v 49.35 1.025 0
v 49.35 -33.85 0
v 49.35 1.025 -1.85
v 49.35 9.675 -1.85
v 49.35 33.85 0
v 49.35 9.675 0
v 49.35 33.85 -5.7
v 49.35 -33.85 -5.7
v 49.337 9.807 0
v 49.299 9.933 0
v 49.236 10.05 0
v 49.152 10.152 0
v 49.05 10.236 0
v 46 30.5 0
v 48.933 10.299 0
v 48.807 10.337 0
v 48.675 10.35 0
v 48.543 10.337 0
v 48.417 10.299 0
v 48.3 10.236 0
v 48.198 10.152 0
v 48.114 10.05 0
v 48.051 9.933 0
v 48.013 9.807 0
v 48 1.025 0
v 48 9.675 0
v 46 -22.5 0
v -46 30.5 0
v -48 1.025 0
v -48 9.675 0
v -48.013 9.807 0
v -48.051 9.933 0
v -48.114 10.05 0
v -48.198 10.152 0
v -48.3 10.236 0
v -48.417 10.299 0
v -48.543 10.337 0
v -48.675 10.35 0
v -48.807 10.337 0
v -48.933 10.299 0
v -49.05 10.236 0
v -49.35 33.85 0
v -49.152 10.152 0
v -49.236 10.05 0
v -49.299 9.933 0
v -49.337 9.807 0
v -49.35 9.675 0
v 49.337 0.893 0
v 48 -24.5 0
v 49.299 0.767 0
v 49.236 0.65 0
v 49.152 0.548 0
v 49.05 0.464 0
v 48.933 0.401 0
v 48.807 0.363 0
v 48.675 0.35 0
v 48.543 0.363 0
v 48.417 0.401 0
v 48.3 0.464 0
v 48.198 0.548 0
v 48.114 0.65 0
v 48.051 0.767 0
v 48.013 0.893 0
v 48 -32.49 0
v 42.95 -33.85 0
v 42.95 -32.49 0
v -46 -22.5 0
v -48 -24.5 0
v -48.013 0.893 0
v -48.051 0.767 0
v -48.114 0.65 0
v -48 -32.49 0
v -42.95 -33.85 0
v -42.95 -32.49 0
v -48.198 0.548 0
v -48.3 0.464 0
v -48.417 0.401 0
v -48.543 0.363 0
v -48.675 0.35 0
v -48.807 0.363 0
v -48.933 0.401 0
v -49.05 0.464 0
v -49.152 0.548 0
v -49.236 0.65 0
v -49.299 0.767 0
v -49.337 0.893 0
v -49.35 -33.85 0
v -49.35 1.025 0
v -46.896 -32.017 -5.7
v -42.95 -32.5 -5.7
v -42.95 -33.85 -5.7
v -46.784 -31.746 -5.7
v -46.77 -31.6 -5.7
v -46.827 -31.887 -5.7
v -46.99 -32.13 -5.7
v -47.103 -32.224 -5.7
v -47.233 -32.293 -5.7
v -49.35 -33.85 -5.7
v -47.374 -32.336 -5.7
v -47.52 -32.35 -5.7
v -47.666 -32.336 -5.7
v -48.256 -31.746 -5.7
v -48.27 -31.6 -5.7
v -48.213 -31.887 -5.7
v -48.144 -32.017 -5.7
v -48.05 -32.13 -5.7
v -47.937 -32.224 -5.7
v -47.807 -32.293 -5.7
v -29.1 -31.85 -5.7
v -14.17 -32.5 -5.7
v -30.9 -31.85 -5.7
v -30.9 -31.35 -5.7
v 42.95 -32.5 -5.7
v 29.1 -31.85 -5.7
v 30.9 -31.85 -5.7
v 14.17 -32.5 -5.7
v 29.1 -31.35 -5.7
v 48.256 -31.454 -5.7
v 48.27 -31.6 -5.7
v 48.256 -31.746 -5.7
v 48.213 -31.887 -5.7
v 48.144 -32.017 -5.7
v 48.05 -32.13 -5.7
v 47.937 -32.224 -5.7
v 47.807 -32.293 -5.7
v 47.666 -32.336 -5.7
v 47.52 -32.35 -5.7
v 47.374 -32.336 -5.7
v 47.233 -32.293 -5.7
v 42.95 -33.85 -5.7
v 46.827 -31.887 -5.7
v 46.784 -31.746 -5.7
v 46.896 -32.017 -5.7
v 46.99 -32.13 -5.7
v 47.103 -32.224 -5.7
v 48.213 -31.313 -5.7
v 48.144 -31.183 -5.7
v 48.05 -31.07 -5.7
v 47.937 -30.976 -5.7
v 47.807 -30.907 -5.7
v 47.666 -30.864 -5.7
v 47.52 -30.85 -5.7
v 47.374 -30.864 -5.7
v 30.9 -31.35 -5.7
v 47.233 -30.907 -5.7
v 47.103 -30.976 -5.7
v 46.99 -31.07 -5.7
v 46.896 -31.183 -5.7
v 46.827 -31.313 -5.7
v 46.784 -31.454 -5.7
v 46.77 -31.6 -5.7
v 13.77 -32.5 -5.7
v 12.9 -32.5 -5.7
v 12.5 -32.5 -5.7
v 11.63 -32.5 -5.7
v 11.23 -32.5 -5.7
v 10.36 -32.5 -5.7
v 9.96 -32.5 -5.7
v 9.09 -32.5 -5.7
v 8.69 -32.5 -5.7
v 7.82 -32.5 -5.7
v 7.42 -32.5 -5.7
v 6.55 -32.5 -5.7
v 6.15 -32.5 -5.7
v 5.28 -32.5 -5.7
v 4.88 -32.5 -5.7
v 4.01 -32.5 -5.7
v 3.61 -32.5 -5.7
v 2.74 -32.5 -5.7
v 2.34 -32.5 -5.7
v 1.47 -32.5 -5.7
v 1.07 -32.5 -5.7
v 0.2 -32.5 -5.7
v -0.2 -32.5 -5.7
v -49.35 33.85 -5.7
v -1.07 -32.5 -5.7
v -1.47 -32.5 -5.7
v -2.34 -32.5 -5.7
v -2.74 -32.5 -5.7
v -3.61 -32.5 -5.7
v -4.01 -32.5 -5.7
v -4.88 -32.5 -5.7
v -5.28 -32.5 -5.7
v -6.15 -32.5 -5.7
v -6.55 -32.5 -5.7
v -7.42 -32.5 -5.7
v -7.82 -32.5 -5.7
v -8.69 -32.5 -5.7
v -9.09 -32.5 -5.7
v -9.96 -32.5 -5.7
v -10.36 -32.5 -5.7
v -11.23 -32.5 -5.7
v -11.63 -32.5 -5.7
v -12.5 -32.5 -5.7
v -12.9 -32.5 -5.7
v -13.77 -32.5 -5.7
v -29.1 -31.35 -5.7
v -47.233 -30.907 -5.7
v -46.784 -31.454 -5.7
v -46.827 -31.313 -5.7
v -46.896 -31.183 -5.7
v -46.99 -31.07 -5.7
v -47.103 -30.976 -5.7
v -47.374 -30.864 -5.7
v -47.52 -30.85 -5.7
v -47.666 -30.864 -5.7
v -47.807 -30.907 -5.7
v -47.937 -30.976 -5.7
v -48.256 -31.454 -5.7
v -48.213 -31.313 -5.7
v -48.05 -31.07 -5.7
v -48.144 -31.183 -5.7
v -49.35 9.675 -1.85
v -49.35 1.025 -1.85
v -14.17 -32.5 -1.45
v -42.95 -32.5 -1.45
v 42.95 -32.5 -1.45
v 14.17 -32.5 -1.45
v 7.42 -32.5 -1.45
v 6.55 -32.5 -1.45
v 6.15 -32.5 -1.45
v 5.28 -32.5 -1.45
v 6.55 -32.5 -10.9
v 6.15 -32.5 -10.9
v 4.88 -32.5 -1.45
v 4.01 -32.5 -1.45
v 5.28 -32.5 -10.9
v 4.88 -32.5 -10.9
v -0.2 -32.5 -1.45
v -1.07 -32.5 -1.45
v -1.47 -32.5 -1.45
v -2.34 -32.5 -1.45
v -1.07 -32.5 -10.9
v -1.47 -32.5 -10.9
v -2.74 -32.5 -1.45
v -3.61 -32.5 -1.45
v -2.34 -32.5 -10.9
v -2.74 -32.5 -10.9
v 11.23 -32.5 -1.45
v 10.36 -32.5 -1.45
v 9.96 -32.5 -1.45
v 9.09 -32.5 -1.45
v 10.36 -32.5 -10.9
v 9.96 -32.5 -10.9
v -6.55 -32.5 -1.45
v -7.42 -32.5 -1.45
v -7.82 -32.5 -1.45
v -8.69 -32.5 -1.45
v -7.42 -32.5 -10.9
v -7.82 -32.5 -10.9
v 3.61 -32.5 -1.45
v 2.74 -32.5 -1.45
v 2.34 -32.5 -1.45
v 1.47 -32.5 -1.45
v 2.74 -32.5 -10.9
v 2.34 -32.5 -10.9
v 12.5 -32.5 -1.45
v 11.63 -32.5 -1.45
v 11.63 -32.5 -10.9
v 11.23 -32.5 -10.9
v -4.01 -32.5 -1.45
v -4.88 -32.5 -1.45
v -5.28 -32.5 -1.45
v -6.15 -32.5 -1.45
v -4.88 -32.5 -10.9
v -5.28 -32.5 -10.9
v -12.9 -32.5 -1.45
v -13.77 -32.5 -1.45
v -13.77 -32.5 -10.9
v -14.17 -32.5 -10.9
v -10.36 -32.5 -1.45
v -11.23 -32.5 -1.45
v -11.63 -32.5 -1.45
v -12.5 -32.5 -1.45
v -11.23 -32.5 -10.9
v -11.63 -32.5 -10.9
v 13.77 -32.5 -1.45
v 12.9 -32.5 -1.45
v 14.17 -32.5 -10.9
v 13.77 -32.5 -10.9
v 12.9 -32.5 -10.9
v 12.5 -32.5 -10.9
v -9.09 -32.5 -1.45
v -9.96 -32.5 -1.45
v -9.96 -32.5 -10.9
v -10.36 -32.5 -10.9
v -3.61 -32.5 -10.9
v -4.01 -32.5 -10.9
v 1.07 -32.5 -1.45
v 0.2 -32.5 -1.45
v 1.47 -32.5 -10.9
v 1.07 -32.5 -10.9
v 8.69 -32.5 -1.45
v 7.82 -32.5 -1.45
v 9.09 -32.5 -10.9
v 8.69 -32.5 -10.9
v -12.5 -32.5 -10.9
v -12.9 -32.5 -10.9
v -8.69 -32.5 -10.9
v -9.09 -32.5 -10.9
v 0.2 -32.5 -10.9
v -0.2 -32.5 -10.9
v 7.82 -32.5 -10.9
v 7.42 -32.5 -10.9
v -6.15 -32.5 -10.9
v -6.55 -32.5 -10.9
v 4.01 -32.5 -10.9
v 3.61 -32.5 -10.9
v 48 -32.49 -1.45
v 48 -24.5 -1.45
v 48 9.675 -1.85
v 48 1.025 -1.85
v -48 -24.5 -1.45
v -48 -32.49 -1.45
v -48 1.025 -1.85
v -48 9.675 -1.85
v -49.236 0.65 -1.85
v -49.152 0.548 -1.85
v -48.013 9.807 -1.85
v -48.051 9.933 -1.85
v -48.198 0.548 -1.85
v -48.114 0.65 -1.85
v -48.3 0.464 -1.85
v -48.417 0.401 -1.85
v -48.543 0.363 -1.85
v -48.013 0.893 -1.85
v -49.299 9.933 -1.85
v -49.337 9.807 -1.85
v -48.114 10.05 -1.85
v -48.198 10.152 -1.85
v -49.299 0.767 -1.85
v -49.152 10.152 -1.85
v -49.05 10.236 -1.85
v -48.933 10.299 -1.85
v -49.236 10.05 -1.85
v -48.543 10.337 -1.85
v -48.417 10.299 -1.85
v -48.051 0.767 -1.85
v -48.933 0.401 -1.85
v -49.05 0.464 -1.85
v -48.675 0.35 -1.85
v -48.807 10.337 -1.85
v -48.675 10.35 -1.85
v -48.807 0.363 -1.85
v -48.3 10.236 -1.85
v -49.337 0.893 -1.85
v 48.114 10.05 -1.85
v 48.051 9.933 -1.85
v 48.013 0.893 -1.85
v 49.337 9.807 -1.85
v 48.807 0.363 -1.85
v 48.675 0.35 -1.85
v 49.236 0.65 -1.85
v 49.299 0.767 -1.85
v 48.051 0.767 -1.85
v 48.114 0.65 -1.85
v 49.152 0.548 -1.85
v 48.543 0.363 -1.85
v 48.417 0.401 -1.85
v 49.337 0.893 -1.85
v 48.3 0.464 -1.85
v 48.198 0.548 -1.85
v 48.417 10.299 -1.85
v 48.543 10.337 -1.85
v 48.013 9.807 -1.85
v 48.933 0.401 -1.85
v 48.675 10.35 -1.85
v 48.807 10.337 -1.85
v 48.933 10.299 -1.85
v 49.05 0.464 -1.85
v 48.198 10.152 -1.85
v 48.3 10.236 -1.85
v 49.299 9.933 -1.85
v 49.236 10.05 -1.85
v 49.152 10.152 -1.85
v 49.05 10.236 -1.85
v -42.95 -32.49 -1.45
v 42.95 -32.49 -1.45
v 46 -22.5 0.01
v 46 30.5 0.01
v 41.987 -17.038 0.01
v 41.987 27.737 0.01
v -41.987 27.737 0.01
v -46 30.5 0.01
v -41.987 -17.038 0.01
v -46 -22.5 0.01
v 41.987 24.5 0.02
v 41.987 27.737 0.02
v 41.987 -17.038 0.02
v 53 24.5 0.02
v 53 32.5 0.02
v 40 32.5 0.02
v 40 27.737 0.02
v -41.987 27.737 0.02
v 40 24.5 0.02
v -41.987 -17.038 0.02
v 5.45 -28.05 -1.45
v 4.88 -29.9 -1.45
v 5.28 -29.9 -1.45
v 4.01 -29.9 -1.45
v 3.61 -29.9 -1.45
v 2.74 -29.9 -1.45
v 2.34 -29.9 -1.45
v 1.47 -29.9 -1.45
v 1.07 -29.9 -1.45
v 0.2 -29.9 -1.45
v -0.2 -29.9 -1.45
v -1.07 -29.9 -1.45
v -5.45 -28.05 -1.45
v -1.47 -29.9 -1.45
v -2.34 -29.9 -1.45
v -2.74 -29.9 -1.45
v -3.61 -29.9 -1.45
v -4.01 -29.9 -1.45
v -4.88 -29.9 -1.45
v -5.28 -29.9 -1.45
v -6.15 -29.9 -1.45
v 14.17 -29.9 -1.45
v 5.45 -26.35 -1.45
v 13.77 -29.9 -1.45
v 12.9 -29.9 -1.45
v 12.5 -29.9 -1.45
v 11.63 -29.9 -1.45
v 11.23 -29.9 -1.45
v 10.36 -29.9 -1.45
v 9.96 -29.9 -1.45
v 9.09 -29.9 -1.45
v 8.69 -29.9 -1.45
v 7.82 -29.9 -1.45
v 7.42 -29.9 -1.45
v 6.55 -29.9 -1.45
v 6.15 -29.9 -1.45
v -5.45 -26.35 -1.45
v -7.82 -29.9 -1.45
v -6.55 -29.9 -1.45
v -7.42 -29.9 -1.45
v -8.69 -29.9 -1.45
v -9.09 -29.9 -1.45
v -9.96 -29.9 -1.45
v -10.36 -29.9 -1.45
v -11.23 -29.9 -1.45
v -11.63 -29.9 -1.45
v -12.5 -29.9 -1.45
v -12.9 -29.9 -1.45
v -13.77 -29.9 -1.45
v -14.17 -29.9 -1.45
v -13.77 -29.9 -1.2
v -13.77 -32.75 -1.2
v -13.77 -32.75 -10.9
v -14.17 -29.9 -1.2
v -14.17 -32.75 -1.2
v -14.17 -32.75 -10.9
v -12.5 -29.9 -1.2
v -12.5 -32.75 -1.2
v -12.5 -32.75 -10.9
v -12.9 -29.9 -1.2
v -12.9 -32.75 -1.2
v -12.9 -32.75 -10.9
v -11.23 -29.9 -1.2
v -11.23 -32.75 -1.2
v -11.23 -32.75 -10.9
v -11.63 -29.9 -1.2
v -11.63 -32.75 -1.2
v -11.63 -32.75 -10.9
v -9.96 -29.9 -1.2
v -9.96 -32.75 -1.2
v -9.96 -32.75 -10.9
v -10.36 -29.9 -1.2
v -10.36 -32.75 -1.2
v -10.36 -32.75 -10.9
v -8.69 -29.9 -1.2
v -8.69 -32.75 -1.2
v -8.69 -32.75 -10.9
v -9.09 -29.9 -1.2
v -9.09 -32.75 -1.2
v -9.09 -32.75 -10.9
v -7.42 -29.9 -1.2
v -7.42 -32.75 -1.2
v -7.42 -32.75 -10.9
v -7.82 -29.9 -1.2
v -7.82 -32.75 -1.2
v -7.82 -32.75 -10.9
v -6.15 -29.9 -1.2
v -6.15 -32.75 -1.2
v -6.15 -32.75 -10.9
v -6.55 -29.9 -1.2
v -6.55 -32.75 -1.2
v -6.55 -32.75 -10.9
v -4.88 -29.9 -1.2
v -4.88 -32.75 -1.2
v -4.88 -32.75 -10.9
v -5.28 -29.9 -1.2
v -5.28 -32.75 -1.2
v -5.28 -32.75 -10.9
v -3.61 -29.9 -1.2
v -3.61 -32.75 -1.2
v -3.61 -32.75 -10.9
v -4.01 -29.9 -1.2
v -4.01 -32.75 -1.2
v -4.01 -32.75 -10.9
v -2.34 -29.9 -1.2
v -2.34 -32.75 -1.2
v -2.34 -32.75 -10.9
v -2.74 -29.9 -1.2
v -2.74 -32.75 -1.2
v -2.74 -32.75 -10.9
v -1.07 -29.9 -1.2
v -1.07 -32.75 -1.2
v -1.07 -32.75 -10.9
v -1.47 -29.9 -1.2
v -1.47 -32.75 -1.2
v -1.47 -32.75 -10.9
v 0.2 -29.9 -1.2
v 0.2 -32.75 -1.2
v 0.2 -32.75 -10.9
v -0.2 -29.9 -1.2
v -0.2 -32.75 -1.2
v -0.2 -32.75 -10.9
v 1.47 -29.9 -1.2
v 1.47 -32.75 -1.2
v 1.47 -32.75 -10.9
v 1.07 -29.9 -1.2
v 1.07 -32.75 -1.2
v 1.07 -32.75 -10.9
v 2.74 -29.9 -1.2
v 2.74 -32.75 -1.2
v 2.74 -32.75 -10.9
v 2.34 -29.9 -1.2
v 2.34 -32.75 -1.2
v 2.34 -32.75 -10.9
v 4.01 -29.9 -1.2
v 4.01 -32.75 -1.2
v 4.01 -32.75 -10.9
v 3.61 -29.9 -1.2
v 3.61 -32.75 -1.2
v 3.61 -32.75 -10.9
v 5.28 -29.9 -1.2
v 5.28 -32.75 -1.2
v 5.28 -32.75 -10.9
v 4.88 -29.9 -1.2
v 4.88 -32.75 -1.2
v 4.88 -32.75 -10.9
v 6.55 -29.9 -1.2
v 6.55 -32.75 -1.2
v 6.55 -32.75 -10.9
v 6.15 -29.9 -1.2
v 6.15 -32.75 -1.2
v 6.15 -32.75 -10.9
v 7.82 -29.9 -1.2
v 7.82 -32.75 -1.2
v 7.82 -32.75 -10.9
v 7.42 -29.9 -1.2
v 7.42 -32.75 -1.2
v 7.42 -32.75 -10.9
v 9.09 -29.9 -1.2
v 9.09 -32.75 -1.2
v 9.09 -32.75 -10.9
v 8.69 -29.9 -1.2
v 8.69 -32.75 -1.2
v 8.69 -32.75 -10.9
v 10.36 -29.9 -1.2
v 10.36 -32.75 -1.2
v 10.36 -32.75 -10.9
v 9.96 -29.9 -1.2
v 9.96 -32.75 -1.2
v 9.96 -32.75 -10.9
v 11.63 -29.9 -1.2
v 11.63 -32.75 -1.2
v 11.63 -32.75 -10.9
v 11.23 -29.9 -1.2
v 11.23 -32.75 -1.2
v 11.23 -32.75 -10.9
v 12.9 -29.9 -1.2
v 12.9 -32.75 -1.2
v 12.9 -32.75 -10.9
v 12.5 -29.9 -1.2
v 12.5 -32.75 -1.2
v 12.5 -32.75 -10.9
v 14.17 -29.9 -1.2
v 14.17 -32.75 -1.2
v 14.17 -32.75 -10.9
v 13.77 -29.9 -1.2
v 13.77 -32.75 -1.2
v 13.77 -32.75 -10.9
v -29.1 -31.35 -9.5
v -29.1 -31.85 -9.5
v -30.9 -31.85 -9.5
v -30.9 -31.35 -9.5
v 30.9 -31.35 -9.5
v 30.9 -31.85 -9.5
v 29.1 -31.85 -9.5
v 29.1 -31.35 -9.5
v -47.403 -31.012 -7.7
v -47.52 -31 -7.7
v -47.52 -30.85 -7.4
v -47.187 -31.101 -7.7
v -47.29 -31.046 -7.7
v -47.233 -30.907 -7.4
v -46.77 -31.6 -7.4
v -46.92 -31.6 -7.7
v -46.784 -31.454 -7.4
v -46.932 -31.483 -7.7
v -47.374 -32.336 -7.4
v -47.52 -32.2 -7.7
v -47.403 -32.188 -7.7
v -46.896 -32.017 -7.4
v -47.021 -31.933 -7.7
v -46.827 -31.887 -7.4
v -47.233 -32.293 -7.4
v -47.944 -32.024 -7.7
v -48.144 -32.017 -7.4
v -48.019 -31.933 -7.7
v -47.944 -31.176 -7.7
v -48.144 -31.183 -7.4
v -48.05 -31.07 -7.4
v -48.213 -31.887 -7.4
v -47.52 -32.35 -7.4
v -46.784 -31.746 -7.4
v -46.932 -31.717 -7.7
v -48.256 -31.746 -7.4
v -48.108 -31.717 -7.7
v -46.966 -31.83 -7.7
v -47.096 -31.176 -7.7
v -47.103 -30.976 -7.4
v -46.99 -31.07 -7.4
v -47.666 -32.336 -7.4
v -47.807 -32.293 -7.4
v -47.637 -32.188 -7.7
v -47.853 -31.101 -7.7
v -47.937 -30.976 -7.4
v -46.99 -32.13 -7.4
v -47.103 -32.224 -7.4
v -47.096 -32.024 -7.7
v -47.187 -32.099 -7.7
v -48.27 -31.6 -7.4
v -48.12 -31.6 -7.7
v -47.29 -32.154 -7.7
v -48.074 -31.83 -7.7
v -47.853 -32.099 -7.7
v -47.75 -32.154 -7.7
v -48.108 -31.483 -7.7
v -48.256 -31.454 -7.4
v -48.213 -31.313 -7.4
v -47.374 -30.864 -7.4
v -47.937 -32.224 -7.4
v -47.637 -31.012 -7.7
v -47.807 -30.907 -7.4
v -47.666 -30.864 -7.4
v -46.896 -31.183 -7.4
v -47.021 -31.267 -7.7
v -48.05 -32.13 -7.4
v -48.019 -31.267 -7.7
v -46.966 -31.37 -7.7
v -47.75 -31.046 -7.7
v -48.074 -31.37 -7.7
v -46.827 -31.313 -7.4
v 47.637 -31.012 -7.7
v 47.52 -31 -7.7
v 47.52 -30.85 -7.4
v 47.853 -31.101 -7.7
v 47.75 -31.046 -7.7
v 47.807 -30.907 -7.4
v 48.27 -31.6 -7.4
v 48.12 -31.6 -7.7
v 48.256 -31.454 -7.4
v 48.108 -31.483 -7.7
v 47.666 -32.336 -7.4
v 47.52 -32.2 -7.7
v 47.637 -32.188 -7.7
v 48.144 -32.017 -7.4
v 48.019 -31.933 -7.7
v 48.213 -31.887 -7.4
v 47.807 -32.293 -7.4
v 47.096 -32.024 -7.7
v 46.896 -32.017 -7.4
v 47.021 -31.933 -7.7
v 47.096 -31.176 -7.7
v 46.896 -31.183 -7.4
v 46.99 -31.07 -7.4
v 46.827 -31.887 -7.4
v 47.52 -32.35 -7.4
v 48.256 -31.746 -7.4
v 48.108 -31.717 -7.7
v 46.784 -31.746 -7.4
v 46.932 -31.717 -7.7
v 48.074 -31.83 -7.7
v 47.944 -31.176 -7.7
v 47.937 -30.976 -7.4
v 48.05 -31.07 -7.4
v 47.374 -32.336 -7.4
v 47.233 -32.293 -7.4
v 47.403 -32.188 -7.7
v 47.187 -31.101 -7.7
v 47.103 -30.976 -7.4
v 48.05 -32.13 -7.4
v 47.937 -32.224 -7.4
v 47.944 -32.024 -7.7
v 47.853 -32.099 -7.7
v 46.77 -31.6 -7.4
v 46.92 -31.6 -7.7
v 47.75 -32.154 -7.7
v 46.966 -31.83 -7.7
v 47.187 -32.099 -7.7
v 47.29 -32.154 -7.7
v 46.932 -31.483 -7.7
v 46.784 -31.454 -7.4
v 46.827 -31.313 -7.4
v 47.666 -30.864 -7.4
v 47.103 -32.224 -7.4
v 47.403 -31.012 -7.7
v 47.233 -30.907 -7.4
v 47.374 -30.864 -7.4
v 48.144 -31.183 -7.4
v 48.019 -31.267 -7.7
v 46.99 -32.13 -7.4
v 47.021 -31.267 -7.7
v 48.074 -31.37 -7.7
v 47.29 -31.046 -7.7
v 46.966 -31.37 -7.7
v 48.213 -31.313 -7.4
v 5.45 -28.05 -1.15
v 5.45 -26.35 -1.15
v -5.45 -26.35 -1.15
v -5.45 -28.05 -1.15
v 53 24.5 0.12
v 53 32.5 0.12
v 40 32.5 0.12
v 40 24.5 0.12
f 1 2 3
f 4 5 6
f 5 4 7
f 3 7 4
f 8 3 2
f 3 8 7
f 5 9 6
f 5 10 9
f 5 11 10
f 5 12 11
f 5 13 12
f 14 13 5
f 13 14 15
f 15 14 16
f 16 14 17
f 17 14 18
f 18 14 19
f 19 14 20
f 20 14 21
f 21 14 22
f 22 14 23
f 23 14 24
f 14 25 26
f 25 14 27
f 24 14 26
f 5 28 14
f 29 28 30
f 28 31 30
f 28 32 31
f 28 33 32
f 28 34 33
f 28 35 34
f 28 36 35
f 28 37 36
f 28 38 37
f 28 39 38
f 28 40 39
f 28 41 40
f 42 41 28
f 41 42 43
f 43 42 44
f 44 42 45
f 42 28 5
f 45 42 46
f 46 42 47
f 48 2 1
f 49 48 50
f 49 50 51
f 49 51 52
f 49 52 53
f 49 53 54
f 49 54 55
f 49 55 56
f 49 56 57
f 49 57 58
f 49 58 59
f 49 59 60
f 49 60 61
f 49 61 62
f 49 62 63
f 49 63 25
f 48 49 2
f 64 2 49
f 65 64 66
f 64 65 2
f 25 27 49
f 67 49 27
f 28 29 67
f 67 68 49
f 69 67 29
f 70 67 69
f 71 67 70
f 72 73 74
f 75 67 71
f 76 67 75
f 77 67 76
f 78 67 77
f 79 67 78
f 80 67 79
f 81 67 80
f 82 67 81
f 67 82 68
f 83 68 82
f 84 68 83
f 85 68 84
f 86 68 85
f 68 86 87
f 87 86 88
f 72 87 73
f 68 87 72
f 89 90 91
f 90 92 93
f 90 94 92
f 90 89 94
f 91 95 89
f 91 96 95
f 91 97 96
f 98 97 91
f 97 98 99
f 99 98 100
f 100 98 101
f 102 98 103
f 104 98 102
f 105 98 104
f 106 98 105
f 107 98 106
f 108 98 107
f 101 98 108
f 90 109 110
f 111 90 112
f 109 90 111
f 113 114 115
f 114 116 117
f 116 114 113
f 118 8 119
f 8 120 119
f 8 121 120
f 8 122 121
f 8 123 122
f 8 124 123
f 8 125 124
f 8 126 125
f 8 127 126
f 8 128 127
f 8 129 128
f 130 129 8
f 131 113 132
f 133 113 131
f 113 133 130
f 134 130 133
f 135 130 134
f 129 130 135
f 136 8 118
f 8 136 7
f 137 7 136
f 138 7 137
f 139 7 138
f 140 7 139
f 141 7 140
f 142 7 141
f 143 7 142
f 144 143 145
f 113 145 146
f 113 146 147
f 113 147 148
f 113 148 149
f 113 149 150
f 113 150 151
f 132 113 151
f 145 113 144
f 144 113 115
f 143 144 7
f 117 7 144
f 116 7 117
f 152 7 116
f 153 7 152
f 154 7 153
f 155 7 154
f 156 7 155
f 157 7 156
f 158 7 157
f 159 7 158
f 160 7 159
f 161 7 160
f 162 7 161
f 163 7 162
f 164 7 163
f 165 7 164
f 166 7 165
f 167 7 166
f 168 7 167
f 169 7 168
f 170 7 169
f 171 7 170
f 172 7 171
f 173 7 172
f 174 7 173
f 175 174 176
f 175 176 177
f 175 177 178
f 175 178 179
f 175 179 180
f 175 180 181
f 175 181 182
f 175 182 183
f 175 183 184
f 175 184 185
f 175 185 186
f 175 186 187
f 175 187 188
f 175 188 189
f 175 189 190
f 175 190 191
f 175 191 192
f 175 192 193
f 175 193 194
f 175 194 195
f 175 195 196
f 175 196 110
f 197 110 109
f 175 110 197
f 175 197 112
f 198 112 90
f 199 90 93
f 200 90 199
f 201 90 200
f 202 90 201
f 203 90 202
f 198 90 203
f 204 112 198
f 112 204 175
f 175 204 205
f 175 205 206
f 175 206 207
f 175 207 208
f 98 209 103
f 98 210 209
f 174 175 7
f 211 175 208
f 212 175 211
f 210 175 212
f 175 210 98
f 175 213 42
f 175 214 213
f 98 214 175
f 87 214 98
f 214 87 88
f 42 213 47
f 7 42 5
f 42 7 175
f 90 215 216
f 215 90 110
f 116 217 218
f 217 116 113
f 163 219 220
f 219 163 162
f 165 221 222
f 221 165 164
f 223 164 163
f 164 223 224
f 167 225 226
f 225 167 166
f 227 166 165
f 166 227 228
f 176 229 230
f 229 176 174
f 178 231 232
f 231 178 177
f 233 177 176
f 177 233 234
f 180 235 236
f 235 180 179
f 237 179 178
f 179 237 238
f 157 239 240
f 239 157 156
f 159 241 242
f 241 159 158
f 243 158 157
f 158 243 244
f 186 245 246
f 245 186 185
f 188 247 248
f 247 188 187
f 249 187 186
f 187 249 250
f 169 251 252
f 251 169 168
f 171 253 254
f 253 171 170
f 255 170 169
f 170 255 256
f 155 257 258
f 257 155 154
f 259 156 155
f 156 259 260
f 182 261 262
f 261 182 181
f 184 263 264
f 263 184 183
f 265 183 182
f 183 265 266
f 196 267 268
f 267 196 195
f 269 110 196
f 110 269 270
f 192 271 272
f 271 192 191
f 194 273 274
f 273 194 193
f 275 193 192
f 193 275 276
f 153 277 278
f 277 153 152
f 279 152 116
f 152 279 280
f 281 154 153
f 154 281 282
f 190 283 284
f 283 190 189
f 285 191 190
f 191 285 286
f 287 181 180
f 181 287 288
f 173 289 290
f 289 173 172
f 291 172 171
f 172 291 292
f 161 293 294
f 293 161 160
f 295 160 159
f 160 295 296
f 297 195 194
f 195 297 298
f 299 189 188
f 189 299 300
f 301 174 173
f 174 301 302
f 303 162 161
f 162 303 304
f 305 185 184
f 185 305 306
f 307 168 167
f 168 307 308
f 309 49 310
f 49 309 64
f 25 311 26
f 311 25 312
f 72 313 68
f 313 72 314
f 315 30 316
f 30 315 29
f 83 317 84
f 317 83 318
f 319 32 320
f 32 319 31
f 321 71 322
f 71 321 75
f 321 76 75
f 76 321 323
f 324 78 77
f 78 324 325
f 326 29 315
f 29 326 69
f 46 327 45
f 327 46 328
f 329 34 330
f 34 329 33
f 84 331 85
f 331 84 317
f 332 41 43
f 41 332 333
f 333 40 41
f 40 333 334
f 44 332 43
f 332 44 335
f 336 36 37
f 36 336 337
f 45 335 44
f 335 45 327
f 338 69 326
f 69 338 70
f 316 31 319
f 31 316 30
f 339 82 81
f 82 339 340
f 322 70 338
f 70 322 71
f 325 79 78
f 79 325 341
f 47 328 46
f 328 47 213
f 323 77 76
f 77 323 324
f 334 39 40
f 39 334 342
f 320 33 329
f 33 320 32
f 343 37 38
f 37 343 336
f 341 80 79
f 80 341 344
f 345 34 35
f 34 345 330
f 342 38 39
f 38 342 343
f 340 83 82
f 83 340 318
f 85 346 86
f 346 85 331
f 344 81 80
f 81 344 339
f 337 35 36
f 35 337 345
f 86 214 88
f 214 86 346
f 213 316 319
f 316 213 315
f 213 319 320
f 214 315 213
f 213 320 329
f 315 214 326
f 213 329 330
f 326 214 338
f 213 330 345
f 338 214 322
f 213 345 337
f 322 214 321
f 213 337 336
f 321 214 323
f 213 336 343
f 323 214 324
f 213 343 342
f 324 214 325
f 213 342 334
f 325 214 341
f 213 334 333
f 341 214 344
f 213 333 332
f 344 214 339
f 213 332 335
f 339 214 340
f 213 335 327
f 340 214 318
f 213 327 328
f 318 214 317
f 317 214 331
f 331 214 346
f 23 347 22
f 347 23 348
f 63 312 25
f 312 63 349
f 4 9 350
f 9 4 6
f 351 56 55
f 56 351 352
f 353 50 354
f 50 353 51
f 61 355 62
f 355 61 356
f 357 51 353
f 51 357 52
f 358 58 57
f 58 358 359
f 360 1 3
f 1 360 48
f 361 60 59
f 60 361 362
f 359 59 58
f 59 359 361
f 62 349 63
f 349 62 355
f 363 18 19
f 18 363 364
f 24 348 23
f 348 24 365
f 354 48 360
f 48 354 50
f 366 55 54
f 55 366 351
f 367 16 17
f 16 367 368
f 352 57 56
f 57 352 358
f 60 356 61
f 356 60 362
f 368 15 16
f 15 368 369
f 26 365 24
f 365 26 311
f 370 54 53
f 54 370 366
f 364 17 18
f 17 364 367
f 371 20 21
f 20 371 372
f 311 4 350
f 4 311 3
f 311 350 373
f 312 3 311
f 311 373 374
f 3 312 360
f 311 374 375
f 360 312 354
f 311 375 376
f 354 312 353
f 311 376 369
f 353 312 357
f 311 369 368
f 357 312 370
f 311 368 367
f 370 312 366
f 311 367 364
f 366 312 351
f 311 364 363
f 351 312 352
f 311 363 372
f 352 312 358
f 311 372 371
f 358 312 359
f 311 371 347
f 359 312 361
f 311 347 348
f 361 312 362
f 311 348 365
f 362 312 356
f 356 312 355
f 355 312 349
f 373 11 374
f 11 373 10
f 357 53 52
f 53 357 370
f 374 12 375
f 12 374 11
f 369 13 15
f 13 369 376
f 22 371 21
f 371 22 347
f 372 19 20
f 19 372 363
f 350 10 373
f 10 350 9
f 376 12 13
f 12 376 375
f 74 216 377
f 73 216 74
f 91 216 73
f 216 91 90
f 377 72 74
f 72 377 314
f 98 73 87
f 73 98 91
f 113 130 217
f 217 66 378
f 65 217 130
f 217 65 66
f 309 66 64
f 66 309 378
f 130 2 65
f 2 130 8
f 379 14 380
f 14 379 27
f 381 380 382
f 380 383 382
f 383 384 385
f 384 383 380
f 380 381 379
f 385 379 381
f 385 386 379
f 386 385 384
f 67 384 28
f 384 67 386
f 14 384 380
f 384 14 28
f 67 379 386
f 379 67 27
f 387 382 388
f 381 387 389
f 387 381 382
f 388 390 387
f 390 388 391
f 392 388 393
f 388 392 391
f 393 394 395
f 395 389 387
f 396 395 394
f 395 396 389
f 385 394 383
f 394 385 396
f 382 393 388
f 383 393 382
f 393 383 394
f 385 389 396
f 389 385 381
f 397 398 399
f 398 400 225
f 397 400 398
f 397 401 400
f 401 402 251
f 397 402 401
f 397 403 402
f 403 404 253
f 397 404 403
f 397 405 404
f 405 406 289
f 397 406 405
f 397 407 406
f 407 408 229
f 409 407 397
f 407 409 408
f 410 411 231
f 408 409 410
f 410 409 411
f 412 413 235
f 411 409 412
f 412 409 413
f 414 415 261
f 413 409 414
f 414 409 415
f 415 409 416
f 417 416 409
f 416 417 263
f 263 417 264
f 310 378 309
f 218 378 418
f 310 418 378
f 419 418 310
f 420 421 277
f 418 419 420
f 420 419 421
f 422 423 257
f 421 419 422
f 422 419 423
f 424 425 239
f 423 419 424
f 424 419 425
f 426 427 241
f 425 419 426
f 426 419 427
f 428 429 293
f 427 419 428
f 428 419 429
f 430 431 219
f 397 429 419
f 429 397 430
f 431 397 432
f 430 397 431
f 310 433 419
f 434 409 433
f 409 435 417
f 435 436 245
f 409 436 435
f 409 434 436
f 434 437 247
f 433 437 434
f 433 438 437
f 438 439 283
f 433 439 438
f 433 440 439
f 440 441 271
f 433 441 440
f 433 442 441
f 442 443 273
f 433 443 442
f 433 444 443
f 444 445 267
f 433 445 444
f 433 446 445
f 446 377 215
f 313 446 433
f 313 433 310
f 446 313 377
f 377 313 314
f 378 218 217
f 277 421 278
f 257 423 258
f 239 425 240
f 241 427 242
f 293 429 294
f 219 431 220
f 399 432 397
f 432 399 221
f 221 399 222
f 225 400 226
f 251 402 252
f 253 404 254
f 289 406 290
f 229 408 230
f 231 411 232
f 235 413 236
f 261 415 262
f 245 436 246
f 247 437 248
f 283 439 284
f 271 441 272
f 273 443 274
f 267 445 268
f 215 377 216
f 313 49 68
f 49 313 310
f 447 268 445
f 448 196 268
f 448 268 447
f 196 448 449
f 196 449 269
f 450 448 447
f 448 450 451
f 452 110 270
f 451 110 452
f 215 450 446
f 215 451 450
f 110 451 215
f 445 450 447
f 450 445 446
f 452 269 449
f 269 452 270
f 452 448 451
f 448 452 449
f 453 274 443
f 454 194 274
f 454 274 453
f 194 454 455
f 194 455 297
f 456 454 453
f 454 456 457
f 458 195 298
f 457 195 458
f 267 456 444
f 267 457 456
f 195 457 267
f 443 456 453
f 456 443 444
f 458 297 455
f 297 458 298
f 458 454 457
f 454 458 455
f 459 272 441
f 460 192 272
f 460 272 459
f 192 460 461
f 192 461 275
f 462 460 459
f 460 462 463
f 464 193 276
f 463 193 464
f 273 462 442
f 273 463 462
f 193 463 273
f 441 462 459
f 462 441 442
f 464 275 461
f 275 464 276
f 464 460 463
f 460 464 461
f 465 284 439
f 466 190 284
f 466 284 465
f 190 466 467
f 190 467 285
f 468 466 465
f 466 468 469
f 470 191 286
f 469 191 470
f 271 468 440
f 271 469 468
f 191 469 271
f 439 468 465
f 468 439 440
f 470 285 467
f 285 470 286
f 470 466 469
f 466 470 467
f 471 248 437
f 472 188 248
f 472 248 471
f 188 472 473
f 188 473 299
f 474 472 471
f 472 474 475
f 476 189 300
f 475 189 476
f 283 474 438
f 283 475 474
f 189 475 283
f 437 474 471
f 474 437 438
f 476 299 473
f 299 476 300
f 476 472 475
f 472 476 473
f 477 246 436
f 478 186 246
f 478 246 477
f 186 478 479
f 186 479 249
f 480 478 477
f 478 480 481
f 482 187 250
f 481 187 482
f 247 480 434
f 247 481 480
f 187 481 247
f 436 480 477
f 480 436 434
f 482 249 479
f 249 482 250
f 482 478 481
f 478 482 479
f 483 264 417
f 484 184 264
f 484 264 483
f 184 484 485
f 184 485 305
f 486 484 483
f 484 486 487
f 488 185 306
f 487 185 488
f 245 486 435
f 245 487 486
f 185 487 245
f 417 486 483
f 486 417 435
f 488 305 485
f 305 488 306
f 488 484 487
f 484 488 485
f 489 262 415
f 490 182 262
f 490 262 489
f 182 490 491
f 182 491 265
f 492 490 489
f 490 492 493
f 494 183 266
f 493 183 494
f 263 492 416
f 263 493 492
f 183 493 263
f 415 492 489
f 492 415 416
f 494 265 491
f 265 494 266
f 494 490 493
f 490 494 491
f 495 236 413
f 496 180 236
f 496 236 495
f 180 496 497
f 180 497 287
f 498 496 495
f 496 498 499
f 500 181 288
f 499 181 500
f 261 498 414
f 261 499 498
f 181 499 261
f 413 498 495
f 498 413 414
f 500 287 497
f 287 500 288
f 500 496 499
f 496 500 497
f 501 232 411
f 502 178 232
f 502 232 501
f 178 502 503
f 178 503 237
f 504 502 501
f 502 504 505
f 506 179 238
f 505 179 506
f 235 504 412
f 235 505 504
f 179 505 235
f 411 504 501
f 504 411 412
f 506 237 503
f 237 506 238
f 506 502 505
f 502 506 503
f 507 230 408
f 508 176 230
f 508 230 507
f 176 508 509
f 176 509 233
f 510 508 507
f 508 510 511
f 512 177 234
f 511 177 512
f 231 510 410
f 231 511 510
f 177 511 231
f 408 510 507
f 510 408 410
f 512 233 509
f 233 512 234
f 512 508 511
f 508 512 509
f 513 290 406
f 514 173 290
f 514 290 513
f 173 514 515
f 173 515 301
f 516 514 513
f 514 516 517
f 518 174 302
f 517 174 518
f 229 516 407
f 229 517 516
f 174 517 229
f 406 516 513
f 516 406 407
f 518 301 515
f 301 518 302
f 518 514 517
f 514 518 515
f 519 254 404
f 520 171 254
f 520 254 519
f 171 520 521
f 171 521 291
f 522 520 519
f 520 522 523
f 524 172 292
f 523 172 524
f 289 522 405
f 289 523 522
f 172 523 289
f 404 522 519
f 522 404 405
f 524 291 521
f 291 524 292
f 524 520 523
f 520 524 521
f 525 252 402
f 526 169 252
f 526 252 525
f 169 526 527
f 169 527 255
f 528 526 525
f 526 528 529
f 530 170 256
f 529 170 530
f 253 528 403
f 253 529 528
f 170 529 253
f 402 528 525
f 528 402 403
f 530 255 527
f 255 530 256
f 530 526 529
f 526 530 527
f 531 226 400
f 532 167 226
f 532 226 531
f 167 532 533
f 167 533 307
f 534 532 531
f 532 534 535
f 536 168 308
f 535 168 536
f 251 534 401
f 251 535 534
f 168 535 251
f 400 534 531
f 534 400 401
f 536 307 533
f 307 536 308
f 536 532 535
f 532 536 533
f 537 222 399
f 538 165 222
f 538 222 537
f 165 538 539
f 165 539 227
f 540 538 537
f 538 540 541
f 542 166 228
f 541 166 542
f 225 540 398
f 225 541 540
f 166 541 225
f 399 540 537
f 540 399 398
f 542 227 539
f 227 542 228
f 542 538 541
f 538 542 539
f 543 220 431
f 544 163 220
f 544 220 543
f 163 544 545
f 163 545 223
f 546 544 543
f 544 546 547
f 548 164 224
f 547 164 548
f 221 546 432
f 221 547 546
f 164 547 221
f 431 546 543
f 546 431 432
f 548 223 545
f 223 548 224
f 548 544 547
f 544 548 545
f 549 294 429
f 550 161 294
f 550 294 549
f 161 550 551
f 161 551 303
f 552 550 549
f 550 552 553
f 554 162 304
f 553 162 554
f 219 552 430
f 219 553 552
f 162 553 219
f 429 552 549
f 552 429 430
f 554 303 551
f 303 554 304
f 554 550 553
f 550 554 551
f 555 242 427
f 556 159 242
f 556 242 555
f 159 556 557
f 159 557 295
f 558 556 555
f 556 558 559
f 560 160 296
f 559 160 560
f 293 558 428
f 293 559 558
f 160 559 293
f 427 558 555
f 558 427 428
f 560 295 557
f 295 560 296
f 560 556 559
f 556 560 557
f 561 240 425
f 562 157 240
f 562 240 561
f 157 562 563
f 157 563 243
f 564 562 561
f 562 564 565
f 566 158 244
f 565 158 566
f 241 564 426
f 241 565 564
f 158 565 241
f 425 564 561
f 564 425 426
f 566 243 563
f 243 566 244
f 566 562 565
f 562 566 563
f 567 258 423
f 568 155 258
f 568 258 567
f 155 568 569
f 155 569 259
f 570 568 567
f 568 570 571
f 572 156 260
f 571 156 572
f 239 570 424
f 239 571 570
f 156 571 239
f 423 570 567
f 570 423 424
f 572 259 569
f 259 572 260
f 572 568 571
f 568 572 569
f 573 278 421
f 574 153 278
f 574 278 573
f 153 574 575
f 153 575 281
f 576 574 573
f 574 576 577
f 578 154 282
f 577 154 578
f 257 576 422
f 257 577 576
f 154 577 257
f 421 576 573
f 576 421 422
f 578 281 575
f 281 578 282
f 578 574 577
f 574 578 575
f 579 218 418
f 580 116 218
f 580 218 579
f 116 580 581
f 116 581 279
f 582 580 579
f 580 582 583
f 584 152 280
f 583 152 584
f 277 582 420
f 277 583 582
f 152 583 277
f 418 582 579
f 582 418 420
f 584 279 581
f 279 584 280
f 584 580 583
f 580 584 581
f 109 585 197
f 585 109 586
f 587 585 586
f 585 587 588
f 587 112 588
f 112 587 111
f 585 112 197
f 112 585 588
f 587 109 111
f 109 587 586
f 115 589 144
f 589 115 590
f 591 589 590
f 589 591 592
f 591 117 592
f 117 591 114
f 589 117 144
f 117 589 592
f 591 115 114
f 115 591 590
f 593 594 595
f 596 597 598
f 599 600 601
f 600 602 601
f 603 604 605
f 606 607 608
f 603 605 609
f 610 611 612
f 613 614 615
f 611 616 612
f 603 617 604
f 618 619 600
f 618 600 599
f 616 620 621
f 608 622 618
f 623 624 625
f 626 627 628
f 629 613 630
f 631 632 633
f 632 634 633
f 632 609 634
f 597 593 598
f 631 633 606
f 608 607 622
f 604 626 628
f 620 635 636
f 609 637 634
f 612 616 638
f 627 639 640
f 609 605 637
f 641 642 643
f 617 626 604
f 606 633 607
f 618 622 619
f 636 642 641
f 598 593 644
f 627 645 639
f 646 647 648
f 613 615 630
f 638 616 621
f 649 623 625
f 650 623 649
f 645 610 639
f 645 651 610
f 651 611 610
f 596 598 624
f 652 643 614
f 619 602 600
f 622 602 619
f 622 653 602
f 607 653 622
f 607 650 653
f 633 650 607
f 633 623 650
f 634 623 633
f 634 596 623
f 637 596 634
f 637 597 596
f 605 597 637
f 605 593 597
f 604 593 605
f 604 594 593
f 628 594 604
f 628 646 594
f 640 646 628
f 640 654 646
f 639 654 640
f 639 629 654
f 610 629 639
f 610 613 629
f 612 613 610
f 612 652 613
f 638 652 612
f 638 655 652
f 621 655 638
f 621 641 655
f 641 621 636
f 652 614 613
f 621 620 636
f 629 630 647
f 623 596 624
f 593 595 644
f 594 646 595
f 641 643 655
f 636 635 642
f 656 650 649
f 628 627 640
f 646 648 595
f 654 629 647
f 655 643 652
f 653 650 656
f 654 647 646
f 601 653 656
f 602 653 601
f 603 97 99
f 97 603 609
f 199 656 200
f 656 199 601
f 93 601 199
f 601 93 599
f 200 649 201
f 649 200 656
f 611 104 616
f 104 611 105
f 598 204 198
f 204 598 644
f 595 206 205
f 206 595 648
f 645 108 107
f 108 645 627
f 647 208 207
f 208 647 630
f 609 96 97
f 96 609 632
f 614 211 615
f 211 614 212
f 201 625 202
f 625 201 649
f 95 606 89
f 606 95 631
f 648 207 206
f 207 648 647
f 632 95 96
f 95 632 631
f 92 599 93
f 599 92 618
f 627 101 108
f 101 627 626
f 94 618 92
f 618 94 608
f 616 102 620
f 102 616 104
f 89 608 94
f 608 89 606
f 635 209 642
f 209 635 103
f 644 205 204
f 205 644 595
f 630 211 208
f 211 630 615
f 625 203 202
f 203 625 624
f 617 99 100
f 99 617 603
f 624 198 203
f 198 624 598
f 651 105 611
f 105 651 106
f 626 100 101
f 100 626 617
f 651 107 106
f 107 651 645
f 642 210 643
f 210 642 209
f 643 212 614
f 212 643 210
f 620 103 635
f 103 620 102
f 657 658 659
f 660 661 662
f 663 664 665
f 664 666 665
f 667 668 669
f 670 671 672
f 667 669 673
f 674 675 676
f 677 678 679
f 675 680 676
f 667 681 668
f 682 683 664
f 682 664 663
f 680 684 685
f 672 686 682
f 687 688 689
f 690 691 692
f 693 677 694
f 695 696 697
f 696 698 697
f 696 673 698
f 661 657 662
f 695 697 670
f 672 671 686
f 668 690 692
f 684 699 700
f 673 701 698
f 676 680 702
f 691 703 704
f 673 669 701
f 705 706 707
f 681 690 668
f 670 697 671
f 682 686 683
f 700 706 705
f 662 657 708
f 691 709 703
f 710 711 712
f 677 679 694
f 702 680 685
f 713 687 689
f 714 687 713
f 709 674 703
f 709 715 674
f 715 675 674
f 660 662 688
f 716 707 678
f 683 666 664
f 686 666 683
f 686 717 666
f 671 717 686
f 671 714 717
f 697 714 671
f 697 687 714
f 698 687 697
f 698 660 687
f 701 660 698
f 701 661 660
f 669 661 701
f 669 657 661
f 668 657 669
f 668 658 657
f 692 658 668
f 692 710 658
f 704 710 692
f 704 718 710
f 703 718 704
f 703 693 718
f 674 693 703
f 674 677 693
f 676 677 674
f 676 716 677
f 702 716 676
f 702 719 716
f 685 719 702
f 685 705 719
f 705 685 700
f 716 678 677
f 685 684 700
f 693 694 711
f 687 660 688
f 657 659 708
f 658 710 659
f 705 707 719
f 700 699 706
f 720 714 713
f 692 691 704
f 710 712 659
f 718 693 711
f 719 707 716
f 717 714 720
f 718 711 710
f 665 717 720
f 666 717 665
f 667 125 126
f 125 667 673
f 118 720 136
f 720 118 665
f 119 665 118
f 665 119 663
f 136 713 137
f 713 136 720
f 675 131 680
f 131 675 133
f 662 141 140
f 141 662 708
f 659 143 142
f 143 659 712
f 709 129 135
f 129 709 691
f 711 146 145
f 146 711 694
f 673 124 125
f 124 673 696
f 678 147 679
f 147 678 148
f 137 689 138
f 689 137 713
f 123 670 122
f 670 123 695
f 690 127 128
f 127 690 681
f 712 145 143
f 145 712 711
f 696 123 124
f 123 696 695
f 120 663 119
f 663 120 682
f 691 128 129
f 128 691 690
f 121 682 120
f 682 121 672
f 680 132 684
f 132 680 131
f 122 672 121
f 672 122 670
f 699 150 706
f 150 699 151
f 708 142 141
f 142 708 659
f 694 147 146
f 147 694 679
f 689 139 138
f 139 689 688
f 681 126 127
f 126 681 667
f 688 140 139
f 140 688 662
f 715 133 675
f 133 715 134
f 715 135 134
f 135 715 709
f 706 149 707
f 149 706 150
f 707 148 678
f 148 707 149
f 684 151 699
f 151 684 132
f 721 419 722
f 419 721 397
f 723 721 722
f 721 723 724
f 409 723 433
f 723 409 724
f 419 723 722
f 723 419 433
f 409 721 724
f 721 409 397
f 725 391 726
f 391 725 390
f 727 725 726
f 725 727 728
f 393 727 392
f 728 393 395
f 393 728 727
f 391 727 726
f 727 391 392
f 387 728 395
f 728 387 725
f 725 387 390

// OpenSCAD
// =====================================================================
//  Winstar WO240128A-class 240x128 COG graphic LCD (UC1608) -- OpenSCAD model
//  Transcribed from the Winstar outline drawing (98.7 x 67.7 mm LB outline,
//  96.0 x 65.0 mm glass, VA 92.0 x 53.0, AA 83.975 x 44.775, 23 pins @ 1.27,
//  LED pins A/K, 2 x dia 1.5 locating pegs, 9.5 mm max overall thickness).
//
//  Units: mm.
//  Coordinate frame (matches the drawing's FRONT view):
//     +X = right, +Y = up, +Z = toward the viewer (out of the glass).
//     Z = 0 is the glass FRONT face. Everything else lies at Z < 0.
//     The pins and pegs are bent 90 deg and point toward -Z (into the PCB),
//     so the module lies flat on a PCB with the frame's rear face on it.
//
//  Origin choices (see `origin` below):
//     lb_center  = centre of the 98.7 x 67.7 outline (default)
//     aa_center  = centre of the 240x128 active area (handy for bezel cut-outs)
//     lb_corner  = bottom-left corner of the outline
//     pin1       = pin-1 leg centreline (handy for PCB alignment)
//
//  Modes:
//     mode = "3d"        full model
//     mode = "footprint" 2D outline + hole pattern in the PCB plane (export DXF)
//     mode = "bezel"     2D cut-out helper (VA / AA / glass outlines)
//
//  Dimensions marked (est.) were scaled off the drawing, not dimensioned on it.
//  Pin-tab height, A/K pin thickness, chip size and the pull-tape length are
//  cosmetic; everything that affects a PCB or bezel is from the drawing.
// =====================================================================

/* [Output] */
mode   = "3d";        // ["3d", "footprint", "bezel"]
origin = "lb_center"; // ["lb_center", "aa_center", "lb_corner", "pin1"]

/* [Show / hide] */
show_frame     = true;
show_glass     = true;
show_pins      = true;
show_led_pins  = true;
show_pegs      = true;
show_chip      = true;
show_pull_tape = true;
show_va_aa     = true;   // tint the viewing / active areas on the glass
show_dots      = false;  // draw the 240x128 dot matrix (30,720 cubes: preview only, slow)
dot_step       = 4;      // when show_dots: draw every Nth dot (1 = all)
explode        = 0;      // pull the glass / frame / pins apart along Z (mm)

/* [Resolution] */
$fn = 32;

/* [LB outline: backlight + frame] */
lb_w       = 98.7;   // +/-0.5
lb_h       = 67.7;   // +/-0.5
lb_t       = 2.8;    // backlight thickness +/-0.3 (behind the glass)
frame_wall = 1.35;   // side/top wall = (lb_w - lcd_w)/2 = (lb_h - lcd_h)/2
foot_w     = 6.4;    // end caps at the two bottom corners (est.)
foot_h     = 1.35;   // they reach 1.35 below the glass bottom edge

/* [LCD glass] */
lcd_w   = 96.0;      // +/-0.2
lcd_h   = 65.0;      // +/-0.2
lcd_t   = 2.9;       // 2.9 MAX (2 x 1.1 glass + polarizers)
ledge_h = 8.0;       // COG ledge: the front plate stops 8.0 above the bottom edge

/* [Viewing area / active area (drawing references them to the LB outline)] */
va_w = 92.0;  va_h = 53.0;
va_x0 = 3.35;         // LB left edge -> VA left edge
va_ytop = 3.35;       // LB top edge  -> VA top edge
aa_w = 83.975; aa_h = 44.775;
aa_x0 = 7.3625;       // (lb_w - aa_w)/2  (drawing: 7.363)
aa_ytop = 6.1125;     // LB top edge -> AA top edge
cols = 240; rows = 128;
dot_pitch = 0.35; dot_size = 0.325;

/* [Signal pins (23 x, bent 90 deg toward the rear)] */
n_pins    = 23;
pin_pitch = 1.27;     // P1.27 x 22 = 27.94
pin1_x    = 35.38;    // LB left edge -> pin 1 centre
pin_w     = 0.40;
pin_t     = 0.25;     // +/-0.05
pin_tab_h = 2.6;      // vertical tab soldered on the ledge (est.)
pin_len   = 8.0;      // +/-0.5, measured from the LCD rear face to the tip
pin_y     = 1.225;    // leg centreline above LB bottom edge (drawing: 66.475 from top)

/* [LED backlight pins A / K] */
led_pin_w   = 1.8;
led_pin_t   = 0.5;    // (est.)
led_a_x     = 19.35;  // LB left edge -> A centre
led_k_x     = 79.35;  // = 19.35 + 60.0
led_pin_len = 3.8;    // beyond the frame rear face  (5.7 + 3.8 = 9.5 overall)
led_pin_y   = 2.25;   // centreline above LB bottom edge (drawing: 65.45 from top)

/* [Locating pegs 2 x dia 1.5] */
peg_d   = 1.5;
peg_len = 2.0;        // beyond the frame rear face
peg_x   = 1.83;       // LB left edge -> peg centre  (95.0 between centres)
peg_y   = 2.25;

/* [Cosmetic details] */
chip_w = 10.9; chip_h = 1.7; chip_t = 0.3; chip_y = 6.65;   // UC1608 on the ledge (est.)
tape_len = 13.0; tape_h = 8.0; tape_t = 0.1; tape_overhang = 3.65; // pull tape, top-right
notch_len = 10.0; notch_top = 23.5; notch_depth = 1.85;      // side-wall notch: 10.0 MAX, 23.5 MIN from top

/* [PCB footprint holes (mode = "footprint")] */
pin_hole_d  = 0.9;
peg_hole_d  = 1.6;
led_hole    = [2.3, 1.0];   // slot for the 1.8 x 0.5 LED pins
keepout     = 0.5;          // courtyard margin around the LB outline

// ---------------------------------------------------------------------
//  Derived values
// ---------------------------------------------------------------------
total_t   = lcd_t + lb_t;                 // 5.7 : glass front -> frame rear
lcd_x0    = (lb_w - lcd_w) / 2;           // 1.35
lcd_y0    = (lb_h - lcd_h) / 2;           // 1.35
plate_t   = lcd_t / 2;                    // each glass plate incl. polarizer
ledge_z   = -plate_t;                     // front face of the rear plate (pads + chip live here)
va_y0     = lb_h - va_ytop - va_h;        // 11.35
aa_y0     = lb_h - aa_ytop - aa_h;        // 16.8125
aa_cx     = aa_x0 + aa_w / 2;             // 49.35
aa_cy     = aa_y0 + aa_h / 2;             // 39.2
pin_tip_z = -(lcd_t + pin_len);           // -10.9
led_tip_z = -(total_t + led_pin_len);     // -9.5
peg_tip_z = -(total_t + peg_len);         // -7.7
eps = 0.01;

function pin_x(n) = pin1_x + (n - 1) * pin_pitch;    // n = 1..23, LB-corner frame
function pin_pos(n) = [pin_x(n), pin_y];              // PCB-plane position of pin n

function origin_shift() =
    origin == "aa_center" ? [-aa_cx, -aa_cy, 0] :
    origin == "lb_corner" ? [0, 0, 0] :
    origin == "pin1"      ? [-pin1_x, -pin_y, 0] :
                            [-lb_w / 2, -lb_h / 2, 0];

// ---------------------------------------------------------------------
//  Colours
// ---------------------------------------------------------------------
c_frame = [0.93, 0.93, 0.90];
c_glass = [0.62, 0.78, 0.70, 0.45];
c_va    = [0.84, 0.88, 0.80];
c_aa    = [0.77, 0.83, 0.74];
c_dot   = [0.25, 0.30, 0.25];
c_metal = [0.78, 0.78, 0.80];
c_chip  = [0.12, 0.12, 0.12];
c_tape  = [0.95, 0.55, 0.15, 0.85];

// ---------------------------------------------------------------------
//  Parts (all built in the LB-corner frame: X from the left edge, Y from the
//  bottom edge, Z from the glass front face)
// ---------------------------------------------------------------------

module side_notch(x_wall) {
    // rounded slot through the side wall, open toward the front face
    yc = lb_h - notch_top - notch_len / 2;
    r  = frame_wall / 2;
    hull()
        for (y = [yc - notch_len / 2 + r, yc + notch_len / 2 - r])
            translate([x_wall + frame_wall / 2, y, -notch_depth])
                cylinder(r = r, h = notch_depth + 1);
}

module frame() {
    color(c_frame) {
        difference() {
            // cradle: full outline above the feet line, full thickness
            translate([0, lcd_y0, -total_t]) cube([lb_w, lb_h - lcd_y0, total_t]);
            // pocket the glass sits in (leaves the backlight behind it)
            translate([lcd_x0, lcd_y0 - 1, -lcd_t]) cube([lcd_w, lcd_h + 1, lcd_t + 1]);
            // glue/tape notches in both side walls
            side_notch(0);
            side_notch(lb_w - frame_wall);
        }
        // end caps / feet at the two bottom corners
        for (x = [0, lb_w - foot_w])
            translate([x, 0, -total_t]) cube([foot_w, foot_h + eps, total_t]);
    }
}

module glass() {
    // rear plate: full height, its bottom 8 mm is the COG ledge
    color(c_glass) translate([lcd_x0, lcd_y0, -lcd_t]) cube([lcd_w, lcd_h, plate_t]);
    // front plate: shorter by the ledge
    color(c_glass) translate([lcd_x0, lcd_y0 + ledge_h, -plate_t]) cube([lcd_w, lcd_h - ledge_h, plate_t]);
    if (show_va_aa) {
        color(c_va) translate([va_x0, va_y0, 0])       cube([va_w, va_h, eps]);
        color(c_aa) translate([aa_x0, aa_y0, eps])     cube([aa_w, aa_h, eps]);
    }
    if (show_dots) dots();
}

// One dot at column c (0..239, left->right) and row r (0..127, top->bottom)
module pixel(c, r, h = 0.03) {
    translate([aa_x0 + c * dot_pitch, lb_h - aa_ytop - r * dot_pitch - dot_size, 2 * eps])
        cube([dot_size, dot_size, h]);
}

module dots() {
    color(c_dot)
        for (c = [0 : dot_step : cols - 1], r = [0 : dot_step : rows - 1])
            pixel(c, r);
}

module signal_pin(n) {
    x = pin_x(n);
    color(c_metal) {
        // vertical tab on the ledge (rear plate's front face)
        translate([x - pin_w / 2, lcd_y0, ledge_z]) cube([pin_w, pin_tab_h, pin_t]);
        // leg wrapped under the glass bottom edge, running to the rear
        translate([x - pin_w / 2, pin_y - pin_t / 2, pin_tip_z])
            cube([pin_w, pin_t, -pin_tip_z + ledge_z + pin_t]);
    }
}

module led_pin(x) {
    color(c_metal)
        translate([x - led_pin_w / 2, led_pin_y - led_pin_t / 2, led_tip_z])
            cube([led_pin_w, led_pin_t, led_pin_len + 1]);   // +1 buried in the frame
}

module peg(x) {
    color(c_frame)
        translate([x, peg_y, peg_tip_z])
            cylinder(d1 = peg_d - 0.3, d2 = peg_d, h = 0.3);   // chamfered tip
    color(c_frame)
        translate([x, peg_y, peg_tip_z + 0.3])
            cylinder(d = peg_d, h = peg_len - 0.3 + eps);
}

module chip() {
    color(c_chip)
        translate([lb_w / 2 - chip_w / 2, chip_y - chip_h / 2, ledge_z])
            cube([chip_w, chip_h, chip_t]);
}

module pull_tape() {
    color(c_tape)
        translate([lb_w + tape_overhang - tape_len, lb_h - lcd_y0 - tape_h, 2 * eps])
            cube([tape_len, tape_h, tape_t]);
}

// ---------------------------------------------------------------------
//  Assembly
// ---------------------------------------------------------------------
module wo240128a() {
    if (show_frame) translate([0, 0, -explode]) frame();
    if (show_glass) glass();
    if (show_chip)  chip();
    if (show_pull_tape) pull_tape();
    translate([0, 0, -2 * explode]) {
        if (show_pins)     for (n = [1 : n_pins]) signal_pin(n);
        if (show_led_pins) { led_pin(led_a_x); led_pin(led_k_x); }
        if (show_pegs)     { peg(peg_x); peg(lb_w - peg_x); }
    }
}

// 2D: what the PCB sees (module lying flat, glass up). Export with File > Export > DXF.
module footprint_2d(stroke = 0.1) {
    // courtyard + body outline
    difference() { offset(delta = keepout) square([lb_w, lb_h]); offset(delta = keepout - stroke) square([lb_w, lb_h]); }
    difference() { square([lb_w, lb_h]); offset(delta = -stroke) square([lb_w, lb_h]); }
    // signal pins
    for (n = [1 : n_pins]) translate(pin_pos(n)) circle(d = pin_hole_d);
    // LED pins: rounded slots
    for (x = [led_a_x, led_k_x])
        translate([x, led_pin_y]) hull() for (s = [-1, 1])
            translate([s * (led_hole[0] - led_hole[1]) / 2, 0]) circle(d = led_hole[1]);
    // locating pegs
    for (x = [peg_x, lb_w - peg_x]) translate([x, peg_y]) circle(d = peg_hole_d);
}

// 2D: bezel / window helper (front view). AA = live pixels, VA = clear window.
module bezel_2d(stroke = 0.1) {
    difference() { square([lb_w, lb_h]); offset(delta = -stroke) square([lb_w, lb_h]); }
    translate([lcd_x0, lcd_y0]) difference() { square([lcd_w, lcd_h]); offset(delta = -stroke) square([lcd_w, lcd_h]); }
    translate([va_x0, va_y0])   difference() { square([va_w, va_h]);   offset(delta = -stroke) square([va_w, va_h]); }
    translate([aa_x0, aa_y0])   difference() { square([aa_w, aa_h]);   offset(delta = -stroke) square([aa_w, aa_h]); }
}

translate(origin_shift()) {
    if (mode == "3d")             wo240128a();
    else if (mode == "footprint") footprint_2d();
    else if (mode == "bezel")     bezel_2d();
}

// Handy numbers (relative to the LB bottom-left corner; add origin_shift() for your origin)
echo(str("Overall: ", lb_w, " x ", lb_h, " x ", -led_tip_z, " mm (frame rear face at Z=", -total_t, ")"));
echo(str("AA centre: X=", aa_cx, " Y=", aa_cy, "   VA: ", va_w, "x", va_h, " at X=", va_x0, " Y=", va_y0));
echo(str("Pin 1 leg: X=", pin1_x, " Y=", pin_y, "   pin 23: X=", pin_x(n_pins), "   pitch ", pin_pitch));
echo(str("A: X=", led_a_x, "  K: X=", led_k_x, "  Y=", led_pin_y, "   pegs: X=", peg_x, " & ", lb_w - peg_x, " Y=", peg_y));
echo(str("Origin shift applied (", origin, "): ", origin_shift()));
